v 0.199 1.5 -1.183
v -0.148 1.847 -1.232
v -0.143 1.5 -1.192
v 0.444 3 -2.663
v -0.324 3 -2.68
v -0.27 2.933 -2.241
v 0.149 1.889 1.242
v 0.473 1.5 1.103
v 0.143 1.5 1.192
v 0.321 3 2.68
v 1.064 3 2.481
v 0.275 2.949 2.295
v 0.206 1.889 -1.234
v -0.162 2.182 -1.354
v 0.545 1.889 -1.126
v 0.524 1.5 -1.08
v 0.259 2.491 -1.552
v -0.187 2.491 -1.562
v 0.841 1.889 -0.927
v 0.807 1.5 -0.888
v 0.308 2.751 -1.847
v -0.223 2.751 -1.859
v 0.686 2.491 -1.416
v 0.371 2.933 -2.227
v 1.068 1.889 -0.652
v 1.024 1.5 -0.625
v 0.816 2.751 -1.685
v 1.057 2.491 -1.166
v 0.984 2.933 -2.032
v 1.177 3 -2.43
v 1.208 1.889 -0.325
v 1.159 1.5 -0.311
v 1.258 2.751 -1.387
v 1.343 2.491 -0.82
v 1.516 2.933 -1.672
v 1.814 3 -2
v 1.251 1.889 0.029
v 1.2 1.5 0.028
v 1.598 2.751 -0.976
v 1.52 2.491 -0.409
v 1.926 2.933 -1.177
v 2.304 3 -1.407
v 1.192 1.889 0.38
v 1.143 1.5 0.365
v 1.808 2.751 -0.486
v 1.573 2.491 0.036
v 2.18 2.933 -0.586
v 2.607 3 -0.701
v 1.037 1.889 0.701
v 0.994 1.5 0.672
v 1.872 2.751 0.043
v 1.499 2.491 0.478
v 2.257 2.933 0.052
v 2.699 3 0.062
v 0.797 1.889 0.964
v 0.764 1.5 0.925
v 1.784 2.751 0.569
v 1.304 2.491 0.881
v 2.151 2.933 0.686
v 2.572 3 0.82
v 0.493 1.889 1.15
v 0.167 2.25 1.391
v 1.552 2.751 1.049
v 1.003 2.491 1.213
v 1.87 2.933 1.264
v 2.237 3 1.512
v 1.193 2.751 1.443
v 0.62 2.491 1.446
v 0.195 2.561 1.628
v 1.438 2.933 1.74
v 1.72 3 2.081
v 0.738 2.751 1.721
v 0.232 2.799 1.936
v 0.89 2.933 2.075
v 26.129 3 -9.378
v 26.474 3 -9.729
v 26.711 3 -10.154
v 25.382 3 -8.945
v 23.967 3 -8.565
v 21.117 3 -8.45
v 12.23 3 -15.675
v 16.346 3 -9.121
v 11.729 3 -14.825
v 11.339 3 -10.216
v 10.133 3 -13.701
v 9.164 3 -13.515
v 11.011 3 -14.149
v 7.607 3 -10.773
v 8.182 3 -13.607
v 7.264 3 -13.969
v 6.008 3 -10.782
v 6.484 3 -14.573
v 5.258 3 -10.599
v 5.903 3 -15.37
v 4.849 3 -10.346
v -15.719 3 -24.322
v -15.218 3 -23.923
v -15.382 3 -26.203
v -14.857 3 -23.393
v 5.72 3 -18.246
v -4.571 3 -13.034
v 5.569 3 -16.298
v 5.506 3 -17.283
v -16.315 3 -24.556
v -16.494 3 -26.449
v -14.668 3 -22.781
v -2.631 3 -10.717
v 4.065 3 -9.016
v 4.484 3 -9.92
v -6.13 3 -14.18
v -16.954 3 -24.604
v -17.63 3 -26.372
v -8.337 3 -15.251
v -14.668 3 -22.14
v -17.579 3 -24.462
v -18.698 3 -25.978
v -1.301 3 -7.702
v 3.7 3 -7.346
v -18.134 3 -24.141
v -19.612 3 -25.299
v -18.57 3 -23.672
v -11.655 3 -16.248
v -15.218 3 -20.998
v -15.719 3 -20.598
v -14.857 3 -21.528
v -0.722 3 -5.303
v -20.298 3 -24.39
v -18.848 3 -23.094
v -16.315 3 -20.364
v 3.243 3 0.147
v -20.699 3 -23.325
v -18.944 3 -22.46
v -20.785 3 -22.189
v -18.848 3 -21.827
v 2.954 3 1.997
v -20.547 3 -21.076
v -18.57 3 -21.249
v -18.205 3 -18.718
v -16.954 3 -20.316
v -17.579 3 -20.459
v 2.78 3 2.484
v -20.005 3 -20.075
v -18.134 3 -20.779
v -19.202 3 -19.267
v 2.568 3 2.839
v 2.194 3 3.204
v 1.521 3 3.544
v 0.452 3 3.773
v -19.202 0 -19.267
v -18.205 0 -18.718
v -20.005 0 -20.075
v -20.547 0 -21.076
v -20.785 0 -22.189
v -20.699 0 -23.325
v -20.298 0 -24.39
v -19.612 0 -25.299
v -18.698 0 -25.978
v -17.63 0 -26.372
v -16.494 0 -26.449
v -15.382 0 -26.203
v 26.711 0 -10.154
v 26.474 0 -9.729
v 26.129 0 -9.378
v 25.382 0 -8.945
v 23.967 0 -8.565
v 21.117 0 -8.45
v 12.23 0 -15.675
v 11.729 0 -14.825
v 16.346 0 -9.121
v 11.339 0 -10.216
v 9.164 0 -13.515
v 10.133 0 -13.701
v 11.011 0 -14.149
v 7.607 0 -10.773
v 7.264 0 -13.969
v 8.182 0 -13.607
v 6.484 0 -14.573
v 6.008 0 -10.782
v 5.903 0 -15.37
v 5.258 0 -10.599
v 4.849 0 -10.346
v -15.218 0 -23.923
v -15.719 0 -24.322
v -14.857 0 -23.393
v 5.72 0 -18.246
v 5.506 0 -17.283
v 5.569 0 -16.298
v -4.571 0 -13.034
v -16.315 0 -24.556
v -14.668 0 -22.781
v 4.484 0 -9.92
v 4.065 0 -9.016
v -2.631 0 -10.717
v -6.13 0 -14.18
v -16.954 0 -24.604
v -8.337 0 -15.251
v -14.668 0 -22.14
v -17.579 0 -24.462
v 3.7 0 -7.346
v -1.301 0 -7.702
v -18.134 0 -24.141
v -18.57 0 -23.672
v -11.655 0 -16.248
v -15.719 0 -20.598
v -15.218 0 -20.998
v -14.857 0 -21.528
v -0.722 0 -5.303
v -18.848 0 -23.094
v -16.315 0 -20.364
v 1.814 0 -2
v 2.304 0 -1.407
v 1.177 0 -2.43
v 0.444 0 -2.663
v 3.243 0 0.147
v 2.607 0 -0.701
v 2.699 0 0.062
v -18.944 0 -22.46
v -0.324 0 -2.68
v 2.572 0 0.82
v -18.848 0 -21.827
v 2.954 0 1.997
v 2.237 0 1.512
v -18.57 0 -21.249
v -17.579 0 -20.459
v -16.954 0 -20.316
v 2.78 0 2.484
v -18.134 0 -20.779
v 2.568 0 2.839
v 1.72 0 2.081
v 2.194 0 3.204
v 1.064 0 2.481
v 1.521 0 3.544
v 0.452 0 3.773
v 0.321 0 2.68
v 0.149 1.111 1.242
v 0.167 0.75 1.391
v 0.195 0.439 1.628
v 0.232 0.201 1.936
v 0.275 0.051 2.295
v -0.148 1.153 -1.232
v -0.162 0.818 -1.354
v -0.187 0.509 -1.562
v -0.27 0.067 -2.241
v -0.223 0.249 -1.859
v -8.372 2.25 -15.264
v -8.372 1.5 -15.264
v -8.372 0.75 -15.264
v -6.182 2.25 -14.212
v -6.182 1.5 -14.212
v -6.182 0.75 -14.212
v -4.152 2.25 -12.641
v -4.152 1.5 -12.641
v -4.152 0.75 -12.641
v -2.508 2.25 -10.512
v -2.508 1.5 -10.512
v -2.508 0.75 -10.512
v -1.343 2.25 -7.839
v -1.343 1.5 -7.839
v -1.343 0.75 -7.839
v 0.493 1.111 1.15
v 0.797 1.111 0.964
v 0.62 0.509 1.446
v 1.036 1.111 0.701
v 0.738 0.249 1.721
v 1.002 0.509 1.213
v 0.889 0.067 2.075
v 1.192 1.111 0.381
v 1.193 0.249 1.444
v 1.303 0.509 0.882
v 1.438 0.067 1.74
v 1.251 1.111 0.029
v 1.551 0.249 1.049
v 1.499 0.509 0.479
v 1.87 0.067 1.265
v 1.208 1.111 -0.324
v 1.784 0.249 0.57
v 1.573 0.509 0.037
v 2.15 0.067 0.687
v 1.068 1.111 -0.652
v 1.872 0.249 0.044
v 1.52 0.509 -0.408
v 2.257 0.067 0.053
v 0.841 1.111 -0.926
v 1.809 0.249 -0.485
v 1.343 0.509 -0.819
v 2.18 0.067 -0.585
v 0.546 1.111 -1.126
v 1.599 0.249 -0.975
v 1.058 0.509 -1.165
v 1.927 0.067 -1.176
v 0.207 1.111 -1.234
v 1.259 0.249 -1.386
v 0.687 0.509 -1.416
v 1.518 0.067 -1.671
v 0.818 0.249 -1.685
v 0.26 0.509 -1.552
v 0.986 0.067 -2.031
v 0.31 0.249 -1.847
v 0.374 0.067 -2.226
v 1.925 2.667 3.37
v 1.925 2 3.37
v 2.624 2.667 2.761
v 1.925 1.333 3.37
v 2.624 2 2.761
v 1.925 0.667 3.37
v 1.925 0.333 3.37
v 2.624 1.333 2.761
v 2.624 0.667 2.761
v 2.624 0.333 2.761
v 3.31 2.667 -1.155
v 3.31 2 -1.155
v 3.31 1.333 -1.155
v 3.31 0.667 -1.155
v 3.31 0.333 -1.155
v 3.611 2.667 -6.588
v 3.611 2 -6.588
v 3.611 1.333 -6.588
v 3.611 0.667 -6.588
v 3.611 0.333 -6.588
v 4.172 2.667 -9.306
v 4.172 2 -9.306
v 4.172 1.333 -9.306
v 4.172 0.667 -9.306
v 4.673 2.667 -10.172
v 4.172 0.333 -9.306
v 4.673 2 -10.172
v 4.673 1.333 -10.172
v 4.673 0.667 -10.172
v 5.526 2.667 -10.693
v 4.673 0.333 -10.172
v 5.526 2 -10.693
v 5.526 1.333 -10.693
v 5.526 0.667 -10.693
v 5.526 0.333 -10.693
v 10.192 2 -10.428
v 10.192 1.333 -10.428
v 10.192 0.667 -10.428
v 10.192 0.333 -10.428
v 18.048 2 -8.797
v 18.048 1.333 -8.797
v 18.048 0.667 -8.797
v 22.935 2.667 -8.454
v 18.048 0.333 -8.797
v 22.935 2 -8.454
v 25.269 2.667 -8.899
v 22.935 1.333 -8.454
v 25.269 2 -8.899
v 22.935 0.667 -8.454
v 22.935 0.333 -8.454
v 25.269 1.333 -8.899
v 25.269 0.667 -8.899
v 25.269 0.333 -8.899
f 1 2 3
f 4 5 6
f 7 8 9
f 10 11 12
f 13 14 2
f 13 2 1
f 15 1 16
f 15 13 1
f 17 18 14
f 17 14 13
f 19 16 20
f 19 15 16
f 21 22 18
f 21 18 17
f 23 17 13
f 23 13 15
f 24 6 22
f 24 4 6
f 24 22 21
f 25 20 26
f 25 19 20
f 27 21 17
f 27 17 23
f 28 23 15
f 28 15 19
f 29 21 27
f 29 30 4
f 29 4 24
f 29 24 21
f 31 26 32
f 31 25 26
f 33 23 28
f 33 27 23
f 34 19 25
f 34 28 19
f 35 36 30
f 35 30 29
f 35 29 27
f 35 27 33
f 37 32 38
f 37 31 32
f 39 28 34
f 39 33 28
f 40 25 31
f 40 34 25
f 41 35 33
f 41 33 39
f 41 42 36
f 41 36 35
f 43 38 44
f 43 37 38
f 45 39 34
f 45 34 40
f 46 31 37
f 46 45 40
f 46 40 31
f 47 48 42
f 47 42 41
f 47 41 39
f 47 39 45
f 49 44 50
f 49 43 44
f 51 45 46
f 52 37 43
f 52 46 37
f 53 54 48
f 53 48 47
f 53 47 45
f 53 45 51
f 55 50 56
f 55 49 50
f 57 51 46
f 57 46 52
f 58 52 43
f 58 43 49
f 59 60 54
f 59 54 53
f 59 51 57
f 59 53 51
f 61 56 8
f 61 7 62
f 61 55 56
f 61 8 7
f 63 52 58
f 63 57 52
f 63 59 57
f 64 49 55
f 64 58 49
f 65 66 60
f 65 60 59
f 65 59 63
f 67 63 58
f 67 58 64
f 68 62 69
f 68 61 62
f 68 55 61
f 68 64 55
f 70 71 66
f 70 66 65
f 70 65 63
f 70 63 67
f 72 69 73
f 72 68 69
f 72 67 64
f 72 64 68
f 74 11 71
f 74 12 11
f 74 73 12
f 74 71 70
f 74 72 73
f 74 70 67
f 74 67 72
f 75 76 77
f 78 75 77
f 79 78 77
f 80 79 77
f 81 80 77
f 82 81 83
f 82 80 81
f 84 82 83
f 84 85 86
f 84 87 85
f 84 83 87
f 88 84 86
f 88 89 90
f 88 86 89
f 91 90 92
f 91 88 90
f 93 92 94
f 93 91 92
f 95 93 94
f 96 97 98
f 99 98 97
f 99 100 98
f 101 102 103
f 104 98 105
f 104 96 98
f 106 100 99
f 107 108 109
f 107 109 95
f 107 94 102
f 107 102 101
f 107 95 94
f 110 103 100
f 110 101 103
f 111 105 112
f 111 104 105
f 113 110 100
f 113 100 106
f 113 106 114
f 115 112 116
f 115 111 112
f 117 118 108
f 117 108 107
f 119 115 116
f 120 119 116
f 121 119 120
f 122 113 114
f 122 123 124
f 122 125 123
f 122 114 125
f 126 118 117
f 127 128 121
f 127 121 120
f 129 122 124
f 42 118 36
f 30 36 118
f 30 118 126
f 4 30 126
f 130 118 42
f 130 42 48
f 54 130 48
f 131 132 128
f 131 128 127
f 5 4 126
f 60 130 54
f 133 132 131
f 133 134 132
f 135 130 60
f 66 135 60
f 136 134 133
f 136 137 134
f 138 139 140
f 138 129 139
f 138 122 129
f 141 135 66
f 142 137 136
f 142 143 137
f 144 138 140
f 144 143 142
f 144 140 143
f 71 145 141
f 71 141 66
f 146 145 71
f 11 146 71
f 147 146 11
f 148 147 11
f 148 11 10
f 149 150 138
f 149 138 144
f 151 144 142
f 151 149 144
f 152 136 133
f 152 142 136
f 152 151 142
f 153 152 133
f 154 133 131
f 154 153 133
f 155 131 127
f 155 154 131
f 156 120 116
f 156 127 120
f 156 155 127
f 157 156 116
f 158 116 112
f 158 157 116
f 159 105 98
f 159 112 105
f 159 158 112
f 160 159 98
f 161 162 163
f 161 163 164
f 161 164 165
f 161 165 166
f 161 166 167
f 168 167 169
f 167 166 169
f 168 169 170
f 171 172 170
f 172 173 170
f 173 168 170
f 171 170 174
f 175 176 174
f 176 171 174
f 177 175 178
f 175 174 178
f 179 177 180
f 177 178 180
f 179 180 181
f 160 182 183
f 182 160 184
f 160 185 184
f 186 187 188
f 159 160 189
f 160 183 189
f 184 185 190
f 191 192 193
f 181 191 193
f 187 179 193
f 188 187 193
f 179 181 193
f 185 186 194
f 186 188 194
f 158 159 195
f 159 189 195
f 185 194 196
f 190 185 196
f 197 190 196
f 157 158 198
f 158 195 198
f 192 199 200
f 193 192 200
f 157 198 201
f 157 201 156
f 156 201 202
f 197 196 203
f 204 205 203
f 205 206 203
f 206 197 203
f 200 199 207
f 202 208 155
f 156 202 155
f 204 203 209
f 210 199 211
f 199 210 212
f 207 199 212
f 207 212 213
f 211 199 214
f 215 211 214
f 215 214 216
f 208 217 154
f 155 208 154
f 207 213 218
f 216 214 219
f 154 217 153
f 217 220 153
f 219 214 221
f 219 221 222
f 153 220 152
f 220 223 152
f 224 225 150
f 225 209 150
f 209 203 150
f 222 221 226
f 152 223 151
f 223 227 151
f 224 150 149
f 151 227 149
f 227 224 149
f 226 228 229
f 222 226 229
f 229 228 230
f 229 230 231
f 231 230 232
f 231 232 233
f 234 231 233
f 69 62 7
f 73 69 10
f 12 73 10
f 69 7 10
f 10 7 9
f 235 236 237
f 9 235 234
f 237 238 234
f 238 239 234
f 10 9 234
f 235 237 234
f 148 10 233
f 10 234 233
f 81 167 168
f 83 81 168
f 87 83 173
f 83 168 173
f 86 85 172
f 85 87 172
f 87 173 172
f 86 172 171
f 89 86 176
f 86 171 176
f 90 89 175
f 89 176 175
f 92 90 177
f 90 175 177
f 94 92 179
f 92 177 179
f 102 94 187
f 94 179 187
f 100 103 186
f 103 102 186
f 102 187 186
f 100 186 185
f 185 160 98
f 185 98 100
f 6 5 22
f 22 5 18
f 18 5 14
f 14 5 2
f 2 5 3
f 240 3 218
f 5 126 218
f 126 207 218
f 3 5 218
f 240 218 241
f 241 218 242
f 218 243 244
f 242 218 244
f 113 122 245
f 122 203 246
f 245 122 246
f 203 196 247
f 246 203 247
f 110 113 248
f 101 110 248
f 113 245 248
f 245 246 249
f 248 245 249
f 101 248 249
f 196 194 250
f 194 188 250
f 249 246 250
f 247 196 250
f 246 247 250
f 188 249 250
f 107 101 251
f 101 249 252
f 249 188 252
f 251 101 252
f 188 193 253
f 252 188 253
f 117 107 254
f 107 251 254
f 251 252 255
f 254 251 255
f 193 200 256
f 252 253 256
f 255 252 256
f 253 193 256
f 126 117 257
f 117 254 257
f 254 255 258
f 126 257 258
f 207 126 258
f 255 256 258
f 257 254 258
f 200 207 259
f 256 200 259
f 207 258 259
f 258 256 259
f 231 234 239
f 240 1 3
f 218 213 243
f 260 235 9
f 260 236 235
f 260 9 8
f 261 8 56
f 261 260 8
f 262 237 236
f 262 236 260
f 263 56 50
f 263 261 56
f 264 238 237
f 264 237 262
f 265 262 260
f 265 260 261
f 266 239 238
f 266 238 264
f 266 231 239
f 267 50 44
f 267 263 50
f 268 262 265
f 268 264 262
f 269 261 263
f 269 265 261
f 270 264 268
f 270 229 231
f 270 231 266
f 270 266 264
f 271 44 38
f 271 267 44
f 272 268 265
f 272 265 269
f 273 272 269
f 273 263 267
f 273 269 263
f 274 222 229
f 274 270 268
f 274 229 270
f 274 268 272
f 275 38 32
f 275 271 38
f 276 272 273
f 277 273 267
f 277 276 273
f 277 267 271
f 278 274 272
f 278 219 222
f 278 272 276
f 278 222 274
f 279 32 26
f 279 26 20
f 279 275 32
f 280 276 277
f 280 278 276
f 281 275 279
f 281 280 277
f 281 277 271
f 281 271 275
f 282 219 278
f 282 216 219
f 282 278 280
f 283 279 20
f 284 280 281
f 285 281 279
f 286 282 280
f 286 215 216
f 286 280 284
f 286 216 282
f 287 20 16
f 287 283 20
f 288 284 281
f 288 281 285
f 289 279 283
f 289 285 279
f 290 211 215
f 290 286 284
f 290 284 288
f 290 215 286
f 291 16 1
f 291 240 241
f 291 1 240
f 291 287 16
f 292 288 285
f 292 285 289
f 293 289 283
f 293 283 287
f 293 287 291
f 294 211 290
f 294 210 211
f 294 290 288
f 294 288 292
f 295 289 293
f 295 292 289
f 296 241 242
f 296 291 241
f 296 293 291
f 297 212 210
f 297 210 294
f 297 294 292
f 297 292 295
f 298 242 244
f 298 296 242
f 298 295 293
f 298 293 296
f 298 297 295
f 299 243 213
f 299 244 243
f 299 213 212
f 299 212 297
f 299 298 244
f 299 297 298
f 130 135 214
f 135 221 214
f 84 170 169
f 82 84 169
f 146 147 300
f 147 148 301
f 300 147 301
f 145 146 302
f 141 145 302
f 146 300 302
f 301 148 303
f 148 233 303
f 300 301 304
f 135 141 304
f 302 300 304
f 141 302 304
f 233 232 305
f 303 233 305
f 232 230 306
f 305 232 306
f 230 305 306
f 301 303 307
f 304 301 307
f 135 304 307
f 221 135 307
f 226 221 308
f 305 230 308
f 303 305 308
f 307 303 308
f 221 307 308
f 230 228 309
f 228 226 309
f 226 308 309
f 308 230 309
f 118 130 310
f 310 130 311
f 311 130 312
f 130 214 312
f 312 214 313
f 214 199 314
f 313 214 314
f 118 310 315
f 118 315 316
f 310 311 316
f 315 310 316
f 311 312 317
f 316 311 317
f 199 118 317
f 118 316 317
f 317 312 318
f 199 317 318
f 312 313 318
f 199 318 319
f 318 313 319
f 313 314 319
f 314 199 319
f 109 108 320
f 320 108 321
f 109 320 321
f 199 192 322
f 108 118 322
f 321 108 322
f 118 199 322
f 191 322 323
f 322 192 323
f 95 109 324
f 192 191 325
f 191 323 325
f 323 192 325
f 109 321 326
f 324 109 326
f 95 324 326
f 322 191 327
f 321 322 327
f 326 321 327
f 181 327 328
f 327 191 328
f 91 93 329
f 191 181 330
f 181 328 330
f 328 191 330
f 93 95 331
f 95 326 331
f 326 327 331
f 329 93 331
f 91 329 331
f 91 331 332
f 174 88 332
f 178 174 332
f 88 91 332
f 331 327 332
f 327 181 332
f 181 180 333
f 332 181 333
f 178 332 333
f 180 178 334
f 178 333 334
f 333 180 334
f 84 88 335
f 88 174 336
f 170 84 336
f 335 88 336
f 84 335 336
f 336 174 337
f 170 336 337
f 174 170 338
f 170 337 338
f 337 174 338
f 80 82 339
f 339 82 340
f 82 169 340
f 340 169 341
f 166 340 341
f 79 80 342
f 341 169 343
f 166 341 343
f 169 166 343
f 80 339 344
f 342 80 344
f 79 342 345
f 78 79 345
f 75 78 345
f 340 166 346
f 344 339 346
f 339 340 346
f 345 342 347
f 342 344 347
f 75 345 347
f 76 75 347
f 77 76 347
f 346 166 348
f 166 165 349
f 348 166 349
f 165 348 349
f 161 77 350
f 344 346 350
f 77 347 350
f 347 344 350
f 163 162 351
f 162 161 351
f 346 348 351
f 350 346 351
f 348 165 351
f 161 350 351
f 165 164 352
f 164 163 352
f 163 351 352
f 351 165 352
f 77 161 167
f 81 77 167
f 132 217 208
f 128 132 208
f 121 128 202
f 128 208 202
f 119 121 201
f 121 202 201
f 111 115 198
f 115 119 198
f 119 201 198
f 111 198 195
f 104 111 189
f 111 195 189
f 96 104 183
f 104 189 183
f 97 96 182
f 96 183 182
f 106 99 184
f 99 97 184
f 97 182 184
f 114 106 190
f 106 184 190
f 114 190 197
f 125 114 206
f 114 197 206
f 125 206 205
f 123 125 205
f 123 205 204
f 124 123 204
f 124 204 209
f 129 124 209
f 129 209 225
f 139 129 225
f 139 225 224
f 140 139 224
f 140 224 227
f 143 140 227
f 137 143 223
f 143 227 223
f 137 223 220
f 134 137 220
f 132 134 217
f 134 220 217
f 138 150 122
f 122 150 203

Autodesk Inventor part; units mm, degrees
ref_plane "YZ Plane" through (0, 0, 0) normal (1, 0, 0) x (0, 1, 0)
sketch "Sketch1" plane through (0, 0, 0) normal (0, 1, 0) x (-1, 0, 0)
  circle A0 centre (16.7938, -22.4604) radius 2.15
  arc A1 (-5.7204, -18.2455) -> (-12.2305, -15.6751) centre (-8.9953, -17.0106) ccw
  line L0 (16.7938, -22.4604) -> (-8.9953, -17.0106) construction
  circle A2 centre (-20.5, 0) radius 2
  line L1 (16.7938, -22.4604) -> (-20.5, 0) construction
  arc A3 (15.3824, -26.2031) -> (18.2051, -18.7177) centre (16.7938, -22.4604) ccw
  line L2 (18.2051, -18.7177) -> (11.6553, -16.2478)
  line L3 (-8.9953, -17.0106) -> (-20.5, 0) construction
  line L4 (15.3824, -26.2031) -> (-5.7204, -18.2455)
  line L5 (0, 0) -> (41.7929, 0) construction
  arc A4 (-20.5, 0) -> (-26.6955, -20.4661) centre (16.7938, -22.4604) ccw construction
  line L6 (-31.9485, -28.1003) -> (-25.4326, -11.0103) construction
  arc A5 (-0.1429, 1.1915) -> (0.1429, -1.1915) centre (0, 0) ccw
  line L7 (11.6553, -16.2478) -> (10.1606, -15.6842) construction
  line L8 (10.1606, -15.6842) -> (1.6573, -14.7272) construction
  line L9 (1.6573, -14.7272) -> (1.0111, -8.4303) construction
  line L10 (1.0111, -8.4303) -> (0.1429, -1.1915) construction
  spline S0 degree 4 poles (11.6553, -16.2478) (10.1606, -15.6842) (1.6573, -14.7272) (1.0111, -8.4303) (0.1429, -1.1915) knots 1 1 1 1 1 2 2 2 2 2
  line L11 (0.1429, -1.1915) -> (-0.1429, 1.1915) construction
  line L12 (-0.1429, 1.1915) -> (-0.4525, 3.773)
  line L13 (-20.5, 0) -> (0, 0) construction
  line L14 (-0.4525, 3.773) -> (-2.4778, 3.5301) construction
  line L15 (-2.4778, 3.5301) -> (-3.0764, 2.02) construction
  line L16 (-3.0764, 2.02) -> (-3.317, 0) construction
  line L17 (-3.317, 0) -> (-3.317, -2.3302) construction
  line L18 (-3.317, -2.3302) -> (-3.4686, -4.784) construction
  line L19 (-3.4686, -4.784) -> (-3.6938, -8.4307) construction
  line L20 (-3.6938, -8.4307) -> (-4.5575, -10.4149) construction
  line L21 (-4.5575, -10.4149) -> (-5.8935, -11.2504) construction
  line L22 (-5.8935, -11.2504) -> (-13.9748, -9.8817) construction
  line L23 (-13.9748, -9.8817) -> (-19.6235, -8.0286) construction
  line L24 (-19.6235, -8.0286) -> (-26.0289, -8.3639) construction
  line L25 (-26.0289, -8.3639) -> (-26.7114, -10.1539) construction
  spline S1 degree 4 poles (-0.4525, 3.773) (-2.4778, 3.5301) (-3.0764, 2.02) (-3.317, 0) (-3.317, -2.3302) (-3.4686, -4.784) (-3.6938, -8.4307) (-4.5575, -10.4149) (-5.8935, -11.2504) (-13.9748, -9.8817) (-19.6235, -8.0286) (-26.0289, -8.3639) (-26.7114, -10.1539) knots 0 0 0 0 0 1 2 3 4 5 6 7 8 9 9 9 9 9
  line L26 (16.7938, -22.4604) -> (7.1324, -18.8172) construction
  line L27 (-26.7114, -10.1539) -> (-12.2305, -15.6751)
  dimension "d1" = 7
  dimension "d2" = 26.3586
  dimension "d3" = 4
  dimension "d4" = 43.535
  dimension "d5" = 4
  dimension "d6" = 20.5358
  dimension "d7" = 7
  dimension "d9" = 1.5
  dimension "d10" = 1.2
  dimension "d21" = 17.3
  dimension "d22" = 2.6
  dimension "d23" = 117.5
  dimension "d24" = 4.3
extrude "Extrusion1" add sketch "Sketch1" along normal blind 3 contours A1 L27 S1 L12 A5 S0 L2 A3 L4
fillet "Fillet3" radius 1.5 2 edges at (1.1915, 3, -0.1429) (1.1915, 0, -0.1429)
ref_plane "Work Plane1" through (0, 1.5, 0) normal (0, 1, 0) x (1, 0, 0)
ref_plane "Work Plane2" through (20.5, 0, 0) normal (0, 0, 1) x (-1, 0, 0)
sketch "Sketch3" plane through (20.5, 0, 0) normal (0, 0, 1) x (-1, 0, 0)
  arc A0 (17.8, -3) -> (17.8, 0) centre (17.8, -1.5) ccw projected
  point P0 (20.5, 0)
properties part number "Springy"
